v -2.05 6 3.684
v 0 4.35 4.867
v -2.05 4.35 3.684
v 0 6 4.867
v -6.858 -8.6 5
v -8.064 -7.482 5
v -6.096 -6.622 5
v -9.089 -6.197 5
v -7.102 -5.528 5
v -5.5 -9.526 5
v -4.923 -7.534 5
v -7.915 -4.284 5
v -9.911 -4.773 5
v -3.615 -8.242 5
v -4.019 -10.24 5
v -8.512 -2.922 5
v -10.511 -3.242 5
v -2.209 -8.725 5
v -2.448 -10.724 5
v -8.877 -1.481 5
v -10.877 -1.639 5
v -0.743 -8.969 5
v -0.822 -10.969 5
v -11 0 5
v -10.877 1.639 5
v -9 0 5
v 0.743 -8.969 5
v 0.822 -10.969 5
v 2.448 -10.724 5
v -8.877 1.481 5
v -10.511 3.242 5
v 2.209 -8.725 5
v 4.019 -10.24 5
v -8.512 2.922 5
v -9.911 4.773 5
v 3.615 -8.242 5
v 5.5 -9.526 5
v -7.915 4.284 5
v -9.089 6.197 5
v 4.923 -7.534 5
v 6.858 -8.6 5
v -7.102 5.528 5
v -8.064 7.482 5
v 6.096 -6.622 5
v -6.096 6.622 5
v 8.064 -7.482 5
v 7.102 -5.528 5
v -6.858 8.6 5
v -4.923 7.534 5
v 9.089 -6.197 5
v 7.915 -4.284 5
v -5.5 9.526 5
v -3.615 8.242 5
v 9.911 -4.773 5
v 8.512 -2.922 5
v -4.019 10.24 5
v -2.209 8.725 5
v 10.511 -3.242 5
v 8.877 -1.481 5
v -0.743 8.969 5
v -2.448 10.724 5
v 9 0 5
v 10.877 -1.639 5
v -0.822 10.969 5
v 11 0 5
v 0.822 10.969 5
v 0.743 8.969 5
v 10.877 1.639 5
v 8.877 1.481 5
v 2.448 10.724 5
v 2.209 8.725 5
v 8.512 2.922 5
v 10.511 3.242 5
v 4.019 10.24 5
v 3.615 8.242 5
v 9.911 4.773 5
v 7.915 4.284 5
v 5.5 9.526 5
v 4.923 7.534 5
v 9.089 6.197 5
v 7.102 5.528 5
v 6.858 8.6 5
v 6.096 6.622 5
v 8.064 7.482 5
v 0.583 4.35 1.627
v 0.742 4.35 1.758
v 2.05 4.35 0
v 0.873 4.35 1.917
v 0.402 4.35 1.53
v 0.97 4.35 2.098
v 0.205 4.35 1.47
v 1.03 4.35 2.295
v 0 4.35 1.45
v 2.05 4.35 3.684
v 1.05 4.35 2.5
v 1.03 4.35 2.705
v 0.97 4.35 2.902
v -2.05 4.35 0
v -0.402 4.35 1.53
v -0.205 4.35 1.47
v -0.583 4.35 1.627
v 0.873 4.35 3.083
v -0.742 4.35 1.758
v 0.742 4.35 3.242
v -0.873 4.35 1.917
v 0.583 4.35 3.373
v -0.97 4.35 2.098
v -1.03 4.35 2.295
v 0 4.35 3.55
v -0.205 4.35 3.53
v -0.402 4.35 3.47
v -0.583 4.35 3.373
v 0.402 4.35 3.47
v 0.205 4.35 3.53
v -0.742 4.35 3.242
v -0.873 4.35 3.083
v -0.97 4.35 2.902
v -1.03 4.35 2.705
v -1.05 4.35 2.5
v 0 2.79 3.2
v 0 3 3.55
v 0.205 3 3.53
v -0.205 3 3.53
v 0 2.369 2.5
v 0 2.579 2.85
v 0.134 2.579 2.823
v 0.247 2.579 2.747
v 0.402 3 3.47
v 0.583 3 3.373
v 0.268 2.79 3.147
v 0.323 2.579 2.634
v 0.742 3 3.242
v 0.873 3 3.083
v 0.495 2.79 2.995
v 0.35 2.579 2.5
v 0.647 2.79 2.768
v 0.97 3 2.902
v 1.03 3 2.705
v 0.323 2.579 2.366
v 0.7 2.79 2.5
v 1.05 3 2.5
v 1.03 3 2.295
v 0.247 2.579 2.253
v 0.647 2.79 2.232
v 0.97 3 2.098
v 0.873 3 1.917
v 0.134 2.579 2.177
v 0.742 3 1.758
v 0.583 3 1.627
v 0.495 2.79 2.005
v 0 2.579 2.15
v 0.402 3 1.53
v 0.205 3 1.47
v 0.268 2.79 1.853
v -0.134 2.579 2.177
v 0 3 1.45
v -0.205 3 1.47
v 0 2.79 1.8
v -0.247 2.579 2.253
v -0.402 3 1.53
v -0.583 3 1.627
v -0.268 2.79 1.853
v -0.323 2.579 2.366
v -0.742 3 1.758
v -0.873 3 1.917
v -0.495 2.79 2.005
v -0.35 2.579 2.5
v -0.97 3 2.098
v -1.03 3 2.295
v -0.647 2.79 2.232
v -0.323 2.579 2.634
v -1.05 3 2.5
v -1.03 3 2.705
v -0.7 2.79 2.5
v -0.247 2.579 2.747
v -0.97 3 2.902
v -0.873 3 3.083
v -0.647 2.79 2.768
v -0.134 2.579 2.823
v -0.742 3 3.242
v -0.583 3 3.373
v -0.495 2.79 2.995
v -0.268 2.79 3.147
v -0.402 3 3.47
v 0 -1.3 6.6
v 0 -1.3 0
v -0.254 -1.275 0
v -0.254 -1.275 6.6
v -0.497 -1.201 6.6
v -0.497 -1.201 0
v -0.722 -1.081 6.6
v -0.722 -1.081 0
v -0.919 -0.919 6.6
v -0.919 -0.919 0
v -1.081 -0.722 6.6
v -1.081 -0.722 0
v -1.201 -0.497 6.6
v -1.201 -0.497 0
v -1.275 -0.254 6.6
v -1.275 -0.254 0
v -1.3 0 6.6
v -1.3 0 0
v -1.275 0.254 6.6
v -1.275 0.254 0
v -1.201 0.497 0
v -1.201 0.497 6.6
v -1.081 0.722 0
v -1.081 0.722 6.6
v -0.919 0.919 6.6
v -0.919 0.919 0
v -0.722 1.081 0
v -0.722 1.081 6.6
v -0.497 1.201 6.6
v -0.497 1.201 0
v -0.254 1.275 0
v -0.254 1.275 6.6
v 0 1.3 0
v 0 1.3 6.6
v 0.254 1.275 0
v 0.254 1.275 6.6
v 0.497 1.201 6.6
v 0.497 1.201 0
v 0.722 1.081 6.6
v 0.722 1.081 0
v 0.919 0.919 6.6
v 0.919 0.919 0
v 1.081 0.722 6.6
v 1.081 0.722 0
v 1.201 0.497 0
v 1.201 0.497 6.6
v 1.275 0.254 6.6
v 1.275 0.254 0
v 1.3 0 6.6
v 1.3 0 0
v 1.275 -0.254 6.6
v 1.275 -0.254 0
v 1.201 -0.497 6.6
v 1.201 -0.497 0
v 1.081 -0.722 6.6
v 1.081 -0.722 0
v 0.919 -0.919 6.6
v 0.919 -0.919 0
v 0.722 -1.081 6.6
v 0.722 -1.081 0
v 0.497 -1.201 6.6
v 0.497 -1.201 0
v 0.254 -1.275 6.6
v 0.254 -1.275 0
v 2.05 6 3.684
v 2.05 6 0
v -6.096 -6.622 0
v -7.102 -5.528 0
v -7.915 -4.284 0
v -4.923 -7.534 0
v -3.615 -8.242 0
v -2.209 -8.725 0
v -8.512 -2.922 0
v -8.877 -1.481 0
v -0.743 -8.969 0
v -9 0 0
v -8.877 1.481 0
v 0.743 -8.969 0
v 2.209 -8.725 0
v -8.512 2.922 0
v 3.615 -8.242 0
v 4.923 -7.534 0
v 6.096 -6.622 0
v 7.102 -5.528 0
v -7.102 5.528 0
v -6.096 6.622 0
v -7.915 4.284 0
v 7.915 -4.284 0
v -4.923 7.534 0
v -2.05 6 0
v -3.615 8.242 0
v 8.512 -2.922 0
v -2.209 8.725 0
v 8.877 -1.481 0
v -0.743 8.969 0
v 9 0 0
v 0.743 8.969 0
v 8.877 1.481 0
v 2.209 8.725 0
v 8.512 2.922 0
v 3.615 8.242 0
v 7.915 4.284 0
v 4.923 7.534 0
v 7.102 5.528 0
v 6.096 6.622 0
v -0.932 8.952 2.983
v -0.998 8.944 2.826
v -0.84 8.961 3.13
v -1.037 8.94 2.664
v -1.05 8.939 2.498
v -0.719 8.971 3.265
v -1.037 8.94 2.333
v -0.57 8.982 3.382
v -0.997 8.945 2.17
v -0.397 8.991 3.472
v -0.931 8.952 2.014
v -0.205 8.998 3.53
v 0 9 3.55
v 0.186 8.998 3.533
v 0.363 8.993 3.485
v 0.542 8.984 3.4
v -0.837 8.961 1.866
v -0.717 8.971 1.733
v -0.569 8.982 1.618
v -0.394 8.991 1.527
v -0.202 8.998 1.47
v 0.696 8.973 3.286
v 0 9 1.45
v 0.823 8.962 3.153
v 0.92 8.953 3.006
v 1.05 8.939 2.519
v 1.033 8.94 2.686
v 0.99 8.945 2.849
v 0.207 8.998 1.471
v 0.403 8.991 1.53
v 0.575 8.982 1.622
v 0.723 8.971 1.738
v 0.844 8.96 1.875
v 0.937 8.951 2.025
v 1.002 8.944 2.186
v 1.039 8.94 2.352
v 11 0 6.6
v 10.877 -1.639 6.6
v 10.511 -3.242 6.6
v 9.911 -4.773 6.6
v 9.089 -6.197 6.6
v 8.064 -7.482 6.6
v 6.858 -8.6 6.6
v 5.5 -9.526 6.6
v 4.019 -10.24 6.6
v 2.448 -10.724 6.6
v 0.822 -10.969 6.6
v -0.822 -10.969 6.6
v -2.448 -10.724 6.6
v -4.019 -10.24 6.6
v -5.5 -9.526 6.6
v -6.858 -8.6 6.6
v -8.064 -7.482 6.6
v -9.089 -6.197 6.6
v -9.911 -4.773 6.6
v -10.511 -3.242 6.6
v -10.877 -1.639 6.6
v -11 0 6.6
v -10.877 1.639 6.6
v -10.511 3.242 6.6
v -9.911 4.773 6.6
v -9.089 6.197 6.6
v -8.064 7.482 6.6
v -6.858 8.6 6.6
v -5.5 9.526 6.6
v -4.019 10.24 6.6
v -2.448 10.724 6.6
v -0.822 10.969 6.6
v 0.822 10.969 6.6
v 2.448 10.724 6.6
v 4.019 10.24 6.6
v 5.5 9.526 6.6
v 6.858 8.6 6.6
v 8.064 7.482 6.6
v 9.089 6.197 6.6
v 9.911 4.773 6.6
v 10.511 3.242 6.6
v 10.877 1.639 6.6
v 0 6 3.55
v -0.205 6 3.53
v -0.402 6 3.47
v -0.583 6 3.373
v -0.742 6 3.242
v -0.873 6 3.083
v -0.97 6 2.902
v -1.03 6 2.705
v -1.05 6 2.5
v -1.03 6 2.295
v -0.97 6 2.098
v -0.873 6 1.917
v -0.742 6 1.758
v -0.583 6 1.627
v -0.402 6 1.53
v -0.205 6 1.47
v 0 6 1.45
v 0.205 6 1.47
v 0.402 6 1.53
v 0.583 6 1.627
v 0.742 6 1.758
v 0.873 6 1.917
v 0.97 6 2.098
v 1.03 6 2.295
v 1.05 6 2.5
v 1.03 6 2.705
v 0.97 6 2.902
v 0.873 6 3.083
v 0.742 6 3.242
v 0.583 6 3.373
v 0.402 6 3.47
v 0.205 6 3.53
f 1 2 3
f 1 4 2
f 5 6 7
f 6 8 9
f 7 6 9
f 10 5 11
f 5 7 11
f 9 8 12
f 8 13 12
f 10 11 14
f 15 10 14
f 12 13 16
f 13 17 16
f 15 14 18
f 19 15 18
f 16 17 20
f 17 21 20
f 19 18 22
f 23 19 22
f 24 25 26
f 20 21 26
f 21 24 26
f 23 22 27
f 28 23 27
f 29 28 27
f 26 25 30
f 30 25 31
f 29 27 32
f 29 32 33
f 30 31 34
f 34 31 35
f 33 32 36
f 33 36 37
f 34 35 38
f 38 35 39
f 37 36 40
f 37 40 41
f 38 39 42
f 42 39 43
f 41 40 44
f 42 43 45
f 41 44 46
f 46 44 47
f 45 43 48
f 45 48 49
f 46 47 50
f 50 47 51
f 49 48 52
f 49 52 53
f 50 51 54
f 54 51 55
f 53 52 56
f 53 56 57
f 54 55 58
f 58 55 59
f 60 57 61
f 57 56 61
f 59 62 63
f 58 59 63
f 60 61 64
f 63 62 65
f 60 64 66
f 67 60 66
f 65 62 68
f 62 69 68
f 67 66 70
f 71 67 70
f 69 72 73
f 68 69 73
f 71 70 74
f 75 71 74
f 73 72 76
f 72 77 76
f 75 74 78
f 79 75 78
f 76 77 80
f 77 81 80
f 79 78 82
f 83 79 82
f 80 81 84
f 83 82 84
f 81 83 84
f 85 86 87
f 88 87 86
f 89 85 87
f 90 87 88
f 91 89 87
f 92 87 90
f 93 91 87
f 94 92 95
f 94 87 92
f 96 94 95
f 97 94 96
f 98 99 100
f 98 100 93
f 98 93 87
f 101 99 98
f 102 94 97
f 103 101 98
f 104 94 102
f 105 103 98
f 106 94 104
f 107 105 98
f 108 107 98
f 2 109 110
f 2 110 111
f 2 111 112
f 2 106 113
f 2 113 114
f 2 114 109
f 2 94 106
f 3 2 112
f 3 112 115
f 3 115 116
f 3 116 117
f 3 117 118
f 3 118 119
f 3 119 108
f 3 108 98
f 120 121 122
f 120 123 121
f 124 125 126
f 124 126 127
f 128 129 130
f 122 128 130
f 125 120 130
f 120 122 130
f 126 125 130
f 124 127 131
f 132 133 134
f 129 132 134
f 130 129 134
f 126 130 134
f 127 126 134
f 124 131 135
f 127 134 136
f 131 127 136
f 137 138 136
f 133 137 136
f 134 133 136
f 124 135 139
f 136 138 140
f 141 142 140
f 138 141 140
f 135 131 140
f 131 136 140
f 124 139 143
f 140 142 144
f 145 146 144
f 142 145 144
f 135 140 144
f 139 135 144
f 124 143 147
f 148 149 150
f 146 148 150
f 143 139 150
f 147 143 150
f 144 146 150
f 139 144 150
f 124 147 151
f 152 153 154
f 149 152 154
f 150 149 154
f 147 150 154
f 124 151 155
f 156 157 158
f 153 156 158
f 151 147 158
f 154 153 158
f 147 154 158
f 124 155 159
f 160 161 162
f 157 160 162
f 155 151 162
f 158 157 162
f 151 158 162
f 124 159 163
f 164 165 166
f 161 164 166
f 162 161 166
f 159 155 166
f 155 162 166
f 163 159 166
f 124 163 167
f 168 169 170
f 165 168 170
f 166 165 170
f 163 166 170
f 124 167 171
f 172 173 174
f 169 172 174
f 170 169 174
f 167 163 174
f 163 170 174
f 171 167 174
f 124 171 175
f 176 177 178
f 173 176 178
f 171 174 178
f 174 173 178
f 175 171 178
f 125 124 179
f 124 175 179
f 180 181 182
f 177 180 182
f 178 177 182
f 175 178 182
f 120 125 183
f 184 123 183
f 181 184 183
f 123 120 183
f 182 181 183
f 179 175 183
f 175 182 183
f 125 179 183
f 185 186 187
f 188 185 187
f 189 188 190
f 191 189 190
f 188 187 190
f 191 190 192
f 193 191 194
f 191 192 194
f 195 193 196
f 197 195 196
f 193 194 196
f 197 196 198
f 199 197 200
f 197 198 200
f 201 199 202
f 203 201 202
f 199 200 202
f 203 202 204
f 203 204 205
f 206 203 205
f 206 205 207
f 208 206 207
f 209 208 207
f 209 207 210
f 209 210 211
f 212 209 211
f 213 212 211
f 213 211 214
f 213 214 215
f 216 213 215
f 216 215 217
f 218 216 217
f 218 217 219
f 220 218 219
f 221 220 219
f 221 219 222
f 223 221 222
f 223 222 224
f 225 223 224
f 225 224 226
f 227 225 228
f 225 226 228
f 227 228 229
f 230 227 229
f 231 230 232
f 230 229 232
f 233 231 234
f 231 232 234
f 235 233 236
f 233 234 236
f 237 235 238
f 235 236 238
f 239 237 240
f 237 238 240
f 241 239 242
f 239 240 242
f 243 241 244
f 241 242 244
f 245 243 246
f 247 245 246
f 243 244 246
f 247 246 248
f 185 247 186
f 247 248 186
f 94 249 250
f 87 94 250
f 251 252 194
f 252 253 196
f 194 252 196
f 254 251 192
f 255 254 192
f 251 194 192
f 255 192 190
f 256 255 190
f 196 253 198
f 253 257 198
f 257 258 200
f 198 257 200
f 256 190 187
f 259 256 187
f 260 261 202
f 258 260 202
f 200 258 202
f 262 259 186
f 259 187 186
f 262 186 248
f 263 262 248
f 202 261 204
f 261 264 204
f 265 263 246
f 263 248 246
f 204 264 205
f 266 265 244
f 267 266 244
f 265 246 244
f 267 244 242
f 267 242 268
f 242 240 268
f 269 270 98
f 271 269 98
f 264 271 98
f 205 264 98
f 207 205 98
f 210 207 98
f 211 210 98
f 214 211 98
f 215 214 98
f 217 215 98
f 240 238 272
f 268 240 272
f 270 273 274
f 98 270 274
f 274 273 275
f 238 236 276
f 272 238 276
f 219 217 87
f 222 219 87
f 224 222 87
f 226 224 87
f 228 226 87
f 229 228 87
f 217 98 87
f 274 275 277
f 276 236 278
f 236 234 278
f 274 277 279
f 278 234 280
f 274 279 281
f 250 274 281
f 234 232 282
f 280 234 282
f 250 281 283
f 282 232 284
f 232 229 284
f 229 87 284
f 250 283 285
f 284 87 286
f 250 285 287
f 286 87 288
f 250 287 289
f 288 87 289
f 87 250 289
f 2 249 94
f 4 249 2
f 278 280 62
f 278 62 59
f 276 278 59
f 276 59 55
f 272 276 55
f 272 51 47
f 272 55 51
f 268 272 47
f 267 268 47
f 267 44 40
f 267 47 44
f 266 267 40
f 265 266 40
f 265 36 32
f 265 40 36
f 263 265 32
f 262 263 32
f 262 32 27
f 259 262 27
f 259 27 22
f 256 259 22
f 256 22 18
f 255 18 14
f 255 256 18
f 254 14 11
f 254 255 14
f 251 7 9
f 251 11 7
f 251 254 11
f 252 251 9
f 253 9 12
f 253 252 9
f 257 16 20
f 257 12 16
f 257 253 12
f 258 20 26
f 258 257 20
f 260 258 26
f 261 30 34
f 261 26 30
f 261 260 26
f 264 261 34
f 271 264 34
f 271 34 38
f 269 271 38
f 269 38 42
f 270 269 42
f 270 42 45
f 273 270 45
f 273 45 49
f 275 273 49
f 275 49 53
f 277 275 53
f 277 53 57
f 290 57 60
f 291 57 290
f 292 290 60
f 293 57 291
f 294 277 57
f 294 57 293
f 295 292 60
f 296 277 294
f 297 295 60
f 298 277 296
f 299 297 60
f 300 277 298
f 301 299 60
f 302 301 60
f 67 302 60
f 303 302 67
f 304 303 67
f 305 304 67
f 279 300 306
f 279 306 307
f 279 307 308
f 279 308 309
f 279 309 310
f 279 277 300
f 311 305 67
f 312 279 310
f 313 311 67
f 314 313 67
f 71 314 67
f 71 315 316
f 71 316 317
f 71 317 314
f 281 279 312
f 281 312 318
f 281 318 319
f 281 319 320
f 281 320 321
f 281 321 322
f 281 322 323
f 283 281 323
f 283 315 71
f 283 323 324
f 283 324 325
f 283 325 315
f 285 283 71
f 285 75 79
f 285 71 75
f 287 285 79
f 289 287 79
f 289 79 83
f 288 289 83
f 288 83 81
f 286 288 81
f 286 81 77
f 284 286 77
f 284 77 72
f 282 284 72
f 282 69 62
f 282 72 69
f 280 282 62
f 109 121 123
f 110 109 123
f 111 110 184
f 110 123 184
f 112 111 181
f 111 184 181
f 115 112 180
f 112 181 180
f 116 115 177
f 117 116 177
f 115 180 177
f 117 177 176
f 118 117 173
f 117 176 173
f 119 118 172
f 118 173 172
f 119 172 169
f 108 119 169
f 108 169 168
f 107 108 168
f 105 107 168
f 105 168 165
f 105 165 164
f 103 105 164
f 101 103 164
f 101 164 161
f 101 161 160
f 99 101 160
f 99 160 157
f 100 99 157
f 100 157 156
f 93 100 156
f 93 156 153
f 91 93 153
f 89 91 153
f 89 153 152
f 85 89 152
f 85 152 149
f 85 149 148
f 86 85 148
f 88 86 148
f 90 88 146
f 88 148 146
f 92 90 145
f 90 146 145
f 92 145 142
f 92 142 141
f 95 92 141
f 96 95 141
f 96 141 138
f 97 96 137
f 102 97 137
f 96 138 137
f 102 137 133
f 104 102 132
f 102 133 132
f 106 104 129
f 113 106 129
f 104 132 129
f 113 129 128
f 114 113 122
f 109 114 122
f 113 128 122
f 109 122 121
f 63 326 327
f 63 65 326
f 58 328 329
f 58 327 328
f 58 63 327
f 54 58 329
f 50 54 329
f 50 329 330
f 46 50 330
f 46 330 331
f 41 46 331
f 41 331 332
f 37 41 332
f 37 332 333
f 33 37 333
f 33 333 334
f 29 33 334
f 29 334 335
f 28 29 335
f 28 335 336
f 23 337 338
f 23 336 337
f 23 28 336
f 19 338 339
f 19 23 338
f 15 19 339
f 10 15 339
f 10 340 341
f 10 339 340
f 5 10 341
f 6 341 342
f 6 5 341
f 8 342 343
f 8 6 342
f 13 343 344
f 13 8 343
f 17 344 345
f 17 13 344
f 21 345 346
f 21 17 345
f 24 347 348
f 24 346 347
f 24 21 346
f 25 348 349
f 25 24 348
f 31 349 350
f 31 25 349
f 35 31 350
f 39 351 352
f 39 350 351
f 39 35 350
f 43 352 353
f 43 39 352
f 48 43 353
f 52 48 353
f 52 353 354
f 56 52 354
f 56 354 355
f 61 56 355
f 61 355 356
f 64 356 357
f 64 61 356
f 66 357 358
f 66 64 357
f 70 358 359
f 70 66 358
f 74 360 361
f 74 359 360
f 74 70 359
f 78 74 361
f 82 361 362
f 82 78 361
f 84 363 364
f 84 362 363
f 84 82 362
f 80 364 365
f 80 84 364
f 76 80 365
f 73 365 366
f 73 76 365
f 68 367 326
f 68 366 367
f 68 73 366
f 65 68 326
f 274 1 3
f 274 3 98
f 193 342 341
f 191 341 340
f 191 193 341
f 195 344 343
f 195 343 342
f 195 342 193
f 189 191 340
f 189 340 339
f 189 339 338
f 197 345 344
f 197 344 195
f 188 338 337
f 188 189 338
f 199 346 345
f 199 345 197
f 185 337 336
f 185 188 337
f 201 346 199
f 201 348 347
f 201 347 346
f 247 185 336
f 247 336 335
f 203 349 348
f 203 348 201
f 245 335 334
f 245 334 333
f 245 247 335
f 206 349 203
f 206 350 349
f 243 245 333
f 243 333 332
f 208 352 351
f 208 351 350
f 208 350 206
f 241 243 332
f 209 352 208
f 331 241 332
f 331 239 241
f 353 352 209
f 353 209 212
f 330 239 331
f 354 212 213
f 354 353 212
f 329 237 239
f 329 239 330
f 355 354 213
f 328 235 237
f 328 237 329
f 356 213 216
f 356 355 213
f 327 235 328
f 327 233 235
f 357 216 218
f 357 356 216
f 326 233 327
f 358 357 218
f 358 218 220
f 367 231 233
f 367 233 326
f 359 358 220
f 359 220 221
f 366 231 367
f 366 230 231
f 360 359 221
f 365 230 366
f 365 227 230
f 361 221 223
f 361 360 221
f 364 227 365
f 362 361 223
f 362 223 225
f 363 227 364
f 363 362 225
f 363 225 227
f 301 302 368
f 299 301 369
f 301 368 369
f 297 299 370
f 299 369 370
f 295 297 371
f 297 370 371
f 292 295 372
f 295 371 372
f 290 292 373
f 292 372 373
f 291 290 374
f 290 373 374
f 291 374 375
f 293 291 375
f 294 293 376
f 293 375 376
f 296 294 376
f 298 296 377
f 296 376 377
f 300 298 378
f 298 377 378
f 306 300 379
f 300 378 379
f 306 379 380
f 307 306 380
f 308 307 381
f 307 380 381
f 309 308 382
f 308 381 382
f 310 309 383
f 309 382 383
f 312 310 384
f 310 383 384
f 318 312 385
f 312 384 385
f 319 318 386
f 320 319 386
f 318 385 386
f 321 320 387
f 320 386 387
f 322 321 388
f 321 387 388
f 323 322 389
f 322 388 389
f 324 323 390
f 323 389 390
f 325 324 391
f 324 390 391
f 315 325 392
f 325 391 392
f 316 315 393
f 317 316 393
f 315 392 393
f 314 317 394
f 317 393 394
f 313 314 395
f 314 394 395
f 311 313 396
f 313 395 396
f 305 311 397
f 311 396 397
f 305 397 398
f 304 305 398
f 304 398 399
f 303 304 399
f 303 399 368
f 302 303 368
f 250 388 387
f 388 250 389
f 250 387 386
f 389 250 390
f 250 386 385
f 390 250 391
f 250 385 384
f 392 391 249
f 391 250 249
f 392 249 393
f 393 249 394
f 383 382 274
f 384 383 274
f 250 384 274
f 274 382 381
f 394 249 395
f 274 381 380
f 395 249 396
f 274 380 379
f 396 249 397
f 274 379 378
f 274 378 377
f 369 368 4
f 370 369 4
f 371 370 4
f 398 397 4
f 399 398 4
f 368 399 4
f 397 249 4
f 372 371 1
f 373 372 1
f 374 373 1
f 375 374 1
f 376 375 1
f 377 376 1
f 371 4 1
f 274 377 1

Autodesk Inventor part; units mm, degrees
ref_plane "YZ Plane" through (0, 0, 0) normal (1, 0, 0) x (0, 1, 0)
ref_plane "XY Plane" through (0, 0, 0) normal (0, 0, 1) x (1, 0, 0)
sketch "Sketch1" plane through (0, 0, 0) normal (0, 0, 1) x (1, 0, 0)
  circle A0 centre (0, 0) radius 9
  dimension "d0" = 18
extrude "Extrusion1" add sketch "Sketch1" along normal blind 5
sketch "Sketch2" plane through (0, 0, 5) normal (0, 0, 1) x (1, 0, 0)
  circle A0 centre (0, 0) radius 11
  circle A1 centre (0, 0) radius 9 projected
  dimension "d3" = 2
extrude "Extrusion2" add sketch "Sketch2" along normal blind 1.6 contours A0 | A1
ref_plane "Work Plane1" through (0, 0, 2.5) normal (0, 0, 1) x (1, 0, 0)
sketch "Sketch3" plane through (0, 0, 2.5) normal (0, 0, 1) x (1, 0, 0)
  circle A0 centre (0, 0) radius 9 projected
  point P0 (0, 9)
ref_plane "Work Plane2" through (0, 9, 2.5) normal (0, 1, 0) x (-1, 0, 0)
sketch "Sketch4" plane through (0, 9, 2.5) normal (0, 1, 0) x (-1, 0, 0)
  point P0 (0, -2.5)
  point P1 (0, 0)
hole "Hole1" at (0, 9, 2.5) direction (0, -1, 0) diameter 2.1 depth 6 tip angle 118 clearance for "Socket Head Cap Screw ISO 4762" size "M2" standard "ISO"
ref_plane "Work Plane3" through (0, 6, 2.5) normal (0, 1, 0) x (-1, 0, 0)
sketch "Sketch5" plane through (0, 6, 2.5) normal (0, 1, 0) x (-1, 0, 0)
  circle A0 centre (0, 0) radius 1.05 projected
  line L0 (2.05, 1.1836) -> (2.05, -1.1836)
  line L1 (2.05, -1.1836) -> (0, -2.3671) construction
  line L2 (0, -2.3671) -> (-2.05, -1.1836) construction
  line L3 (-2.05, -1.1836) -> (-2.05, 1.1836)
  line L4 (-2.05, 1.1836) -> (0, 2.3671)
  line L5 (0, 2.3671) -> (2.05, 1.1836)
  line L6 (2.05, -1.1836) -> (2.05, -2.5)
  line L7 (9, -2.5) -> (-9, -2.5) projected
  line L8 (-2.05, -1.1836) -> (-2.05, -2.5)
  point P0 (0, -2.5)
  dimension "d14" = 4.1
extrude "Extrusion3" cut sketch "Sketch5" against normal blind 1.65
sketch "Sketch6" plane through (0, 0, 6.6) normal (0, 0, 1) x (1, 0, 0)
  circle A0 centre (0, 0) radius 3.0931 construction
hole "Hole3" at (0, 0, 6.6) direction (0, 0, -1) diameter 2.6 end through all clearance for "Socket Head Cap Screw ISO 4762" size "M2.5" standard "ISO"
properties part number "Encoder_Mount3_Wheel"
